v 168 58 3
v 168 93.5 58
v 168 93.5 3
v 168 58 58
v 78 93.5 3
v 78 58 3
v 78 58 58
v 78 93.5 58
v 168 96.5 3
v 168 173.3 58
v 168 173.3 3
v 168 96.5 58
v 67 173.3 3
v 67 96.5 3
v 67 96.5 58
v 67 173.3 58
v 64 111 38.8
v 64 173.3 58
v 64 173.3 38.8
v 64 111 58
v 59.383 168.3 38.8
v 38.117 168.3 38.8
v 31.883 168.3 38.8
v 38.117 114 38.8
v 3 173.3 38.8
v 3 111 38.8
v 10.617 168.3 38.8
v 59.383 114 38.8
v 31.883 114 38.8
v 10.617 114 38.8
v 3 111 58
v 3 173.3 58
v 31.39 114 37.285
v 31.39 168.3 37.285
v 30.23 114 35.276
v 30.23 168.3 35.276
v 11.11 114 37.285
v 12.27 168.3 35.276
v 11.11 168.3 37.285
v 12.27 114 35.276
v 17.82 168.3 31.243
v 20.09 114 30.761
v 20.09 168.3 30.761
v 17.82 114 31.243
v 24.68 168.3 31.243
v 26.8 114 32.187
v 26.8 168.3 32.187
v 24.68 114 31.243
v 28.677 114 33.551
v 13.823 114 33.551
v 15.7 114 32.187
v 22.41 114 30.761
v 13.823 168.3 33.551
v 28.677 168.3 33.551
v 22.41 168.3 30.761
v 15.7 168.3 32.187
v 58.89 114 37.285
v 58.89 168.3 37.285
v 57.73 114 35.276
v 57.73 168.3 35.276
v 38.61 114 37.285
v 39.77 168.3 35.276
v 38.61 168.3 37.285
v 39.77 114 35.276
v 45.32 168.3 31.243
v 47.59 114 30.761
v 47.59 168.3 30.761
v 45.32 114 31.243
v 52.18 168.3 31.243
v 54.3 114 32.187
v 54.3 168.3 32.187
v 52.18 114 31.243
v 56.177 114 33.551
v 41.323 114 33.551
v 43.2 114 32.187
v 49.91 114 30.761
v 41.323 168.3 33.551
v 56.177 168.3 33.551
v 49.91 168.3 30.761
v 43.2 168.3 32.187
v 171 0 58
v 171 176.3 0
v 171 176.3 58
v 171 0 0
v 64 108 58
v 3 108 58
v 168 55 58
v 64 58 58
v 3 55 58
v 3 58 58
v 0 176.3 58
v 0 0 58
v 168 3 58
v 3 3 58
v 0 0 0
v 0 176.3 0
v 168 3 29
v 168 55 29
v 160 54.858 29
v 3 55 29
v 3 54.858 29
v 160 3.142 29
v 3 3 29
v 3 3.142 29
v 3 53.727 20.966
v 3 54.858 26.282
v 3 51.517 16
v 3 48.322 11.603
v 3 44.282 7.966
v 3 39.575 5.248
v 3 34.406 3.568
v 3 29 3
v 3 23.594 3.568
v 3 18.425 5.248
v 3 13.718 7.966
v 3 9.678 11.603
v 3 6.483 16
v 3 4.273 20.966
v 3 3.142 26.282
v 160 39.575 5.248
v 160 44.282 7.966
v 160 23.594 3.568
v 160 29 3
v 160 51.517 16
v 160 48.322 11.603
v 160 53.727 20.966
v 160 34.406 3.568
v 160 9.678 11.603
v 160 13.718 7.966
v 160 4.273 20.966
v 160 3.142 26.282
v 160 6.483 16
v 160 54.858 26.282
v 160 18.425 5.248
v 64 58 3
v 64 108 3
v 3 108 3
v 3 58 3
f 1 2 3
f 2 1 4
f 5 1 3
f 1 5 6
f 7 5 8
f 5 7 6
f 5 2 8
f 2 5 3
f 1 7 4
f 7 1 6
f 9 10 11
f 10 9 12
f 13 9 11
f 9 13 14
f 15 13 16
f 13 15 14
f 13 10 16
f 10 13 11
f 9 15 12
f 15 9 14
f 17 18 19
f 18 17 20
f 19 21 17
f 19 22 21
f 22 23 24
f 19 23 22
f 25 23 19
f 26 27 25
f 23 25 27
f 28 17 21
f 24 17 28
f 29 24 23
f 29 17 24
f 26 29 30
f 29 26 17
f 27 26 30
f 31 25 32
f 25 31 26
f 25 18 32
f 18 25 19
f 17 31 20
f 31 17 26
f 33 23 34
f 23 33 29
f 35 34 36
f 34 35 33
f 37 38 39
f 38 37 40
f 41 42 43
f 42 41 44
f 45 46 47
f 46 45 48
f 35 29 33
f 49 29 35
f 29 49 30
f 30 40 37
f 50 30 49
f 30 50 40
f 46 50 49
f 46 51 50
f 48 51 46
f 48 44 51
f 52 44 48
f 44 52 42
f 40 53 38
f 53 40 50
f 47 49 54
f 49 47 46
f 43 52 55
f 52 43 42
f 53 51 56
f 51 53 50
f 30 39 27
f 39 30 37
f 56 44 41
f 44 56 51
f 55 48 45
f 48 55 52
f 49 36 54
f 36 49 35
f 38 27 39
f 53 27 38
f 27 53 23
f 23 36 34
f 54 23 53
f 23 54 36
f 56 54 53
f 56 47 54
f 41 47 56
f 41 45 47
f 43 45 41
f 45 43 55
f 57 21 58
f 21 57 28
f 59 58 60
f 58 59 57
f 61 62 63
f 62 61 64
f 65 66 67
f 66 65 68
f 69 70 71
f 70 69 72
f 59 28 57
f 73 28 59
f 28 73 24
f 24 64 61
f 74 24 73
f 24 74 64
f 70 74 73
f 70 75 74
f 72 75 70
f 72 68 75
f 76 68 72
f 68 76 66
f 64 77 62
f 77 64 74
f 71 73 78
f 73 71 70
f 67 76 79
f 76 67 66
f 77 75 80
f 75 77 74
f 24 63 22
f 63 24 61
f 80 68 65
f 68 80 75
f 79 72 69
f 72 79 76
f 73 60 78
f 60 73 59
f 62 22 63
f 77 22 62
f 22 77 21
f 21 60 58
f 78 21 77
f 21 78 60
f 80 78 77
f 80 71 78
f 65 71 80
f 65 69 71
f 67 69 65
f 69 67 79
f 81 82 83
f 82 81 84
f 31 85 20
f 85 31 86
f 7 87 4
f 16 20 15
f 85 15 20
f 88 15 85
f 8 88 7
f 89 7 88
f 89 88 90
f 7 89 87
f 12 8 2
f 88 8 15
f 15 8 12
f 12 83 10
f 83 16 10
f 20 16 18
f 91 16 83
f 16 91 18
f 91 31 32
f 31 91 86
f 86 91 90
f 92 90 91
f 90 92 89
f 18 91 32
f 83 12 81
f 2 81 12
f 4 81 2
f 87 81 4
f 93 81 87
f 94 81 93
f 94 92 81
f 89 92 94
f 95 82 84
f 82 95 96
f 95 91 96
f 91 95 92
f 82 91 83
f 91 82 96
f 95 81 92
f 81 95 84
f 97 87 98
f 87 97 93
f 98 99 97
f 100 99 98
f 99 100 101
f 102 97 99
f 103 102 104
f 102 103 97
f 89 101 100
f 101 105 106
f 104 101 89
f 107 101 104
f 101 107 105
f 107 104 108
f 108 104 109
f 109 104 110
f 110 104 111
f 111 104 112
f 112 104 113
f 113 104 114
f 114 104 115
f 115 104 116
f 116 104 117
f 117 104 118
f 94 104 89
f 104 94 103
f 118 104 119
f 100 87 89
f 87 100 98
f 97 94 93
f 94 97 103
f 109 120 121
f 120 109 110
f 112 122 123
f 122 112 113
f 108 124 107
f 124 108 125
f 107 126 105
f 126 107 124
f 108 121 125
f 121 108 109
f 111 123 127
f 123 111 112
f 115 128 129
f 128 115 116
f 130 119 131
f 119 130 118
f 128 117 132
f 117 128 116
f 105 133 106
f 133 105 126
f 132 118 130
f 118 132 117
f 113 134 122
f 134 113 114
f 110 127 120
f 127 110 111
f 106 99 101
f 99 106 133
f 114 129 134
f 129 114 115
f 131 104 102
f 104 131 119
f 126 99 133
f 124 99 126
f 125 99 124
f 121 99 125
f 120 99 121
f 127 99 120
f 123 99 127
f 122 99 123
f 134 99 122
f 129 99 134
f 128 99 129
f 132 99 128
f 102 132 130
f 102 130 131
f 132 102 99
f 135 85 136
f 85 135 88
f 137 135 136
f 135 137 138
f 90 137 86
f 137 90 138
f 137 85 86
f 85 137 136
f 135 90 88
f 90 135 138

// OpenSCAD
// file: dims.scad
sharps_container_diameter = 51.5 + 0.5;
sharps_container_height = 157;
bandaid_length = 90;
bandaid_width = 35.5;
swab_height = 50;
swab_width = 45;
syringe_length_soft = 137;
syringe_length_hard = 101;
syringe_width_soft = 39;
syringe_width_hard = 10;
needle_length_soft = 92;
needle_width_soft = 20;
needle_length_hard = 60.25;
needle_width_hard = 8.3;
vial_length = 54.3;
vial_diameter = 21.7 + 0.5;

padding = 1;
extra_padding = 8*padding;
thickness = 3;

vial_slot_depth = vial_length + extra_padding;
vial_slot_width = swab_width + 2*extra_padding;

vs_pad = 3;
vial_vslot_width = vial_diameter * 2 + thickness + 2 * vs_pad;
vial_vslot_height = vial_diameter + thickness + vs_pad/2;
// main file
include <dims.scad>

total_width = 3*thickness + vial_slot_width + syringe_length_hard;
total_depth = 4*thickness + sharps_container_diameter + swab_height + vial_slot_depth;
total_height = 2 * thickness + sharps_container_diameter;
big_vert = 2 * total_height;

difference(){
    cube([total_width, total_depth, total_height]);
    color("red") translate([thickness, thickness, thickness + sharps_container_diameter/2]) cube(
        [total_width-2*thickness, sharps_container_diameter, big_vert + sharps_container_diameter]
    );
    color("blue") translate(
        [thickness, thickness + sharps_container_diameter/2, thickness + sharps_container_diameter/2]
        ) rotate([0, 90, 0]) cylinder(
            sharps_container_height, sharps_container_diameter/2, sharps_container_diameter/2
    );
    
    translate(
        [thickness, 2*thickness + sharps_container_diameter, thickness]
    ) color("purple") cube (
            [vial_slot_width, swab_height, big_vert + vial_diameter/2]
        );

    translate([total_width - thickness, 2*thickness + sharps_container_diameter, thickness]) {
        color("brown") translate([-bandaid_length, 0,  0]) cube (
            [bandaid_length, bandaid_width, big_vert]
        );

        color("orange") translate([-syringe_length_hard, bandaid_width + thickness, 0]) cube (
            [
                syringe_length_hard,
                total_depth - 4* thickness - sharps_container_diameter - bandaid_width,
                big_vert + vial_diameter/2
            ]
        );
    };
    translate(
        [thickness, total_depth - thickness - vial_slot_depth, total_height - vial_diameter + thickness]
    ){ 
        color("green") cube (
                [vial_slot_width, vial_slot_depth, big_vert + vial_diameter/2]
        );
        color("blue") translate(
            [thickness + vial_slot_width/4, thickness, thickness]
            ) rotate([-90, 0, 0]) cylinder(
                vial_length, vial_diameter/2, vial_diameter/2
        );
        color("blue") translate(
            [3*vial_slot_width/4, thickness, thickness]
            ) rotate([-90, 0, 0]) cylinder(
                vial_length, vial_diameter/2, vial_diameter/2
        );
    }
}
